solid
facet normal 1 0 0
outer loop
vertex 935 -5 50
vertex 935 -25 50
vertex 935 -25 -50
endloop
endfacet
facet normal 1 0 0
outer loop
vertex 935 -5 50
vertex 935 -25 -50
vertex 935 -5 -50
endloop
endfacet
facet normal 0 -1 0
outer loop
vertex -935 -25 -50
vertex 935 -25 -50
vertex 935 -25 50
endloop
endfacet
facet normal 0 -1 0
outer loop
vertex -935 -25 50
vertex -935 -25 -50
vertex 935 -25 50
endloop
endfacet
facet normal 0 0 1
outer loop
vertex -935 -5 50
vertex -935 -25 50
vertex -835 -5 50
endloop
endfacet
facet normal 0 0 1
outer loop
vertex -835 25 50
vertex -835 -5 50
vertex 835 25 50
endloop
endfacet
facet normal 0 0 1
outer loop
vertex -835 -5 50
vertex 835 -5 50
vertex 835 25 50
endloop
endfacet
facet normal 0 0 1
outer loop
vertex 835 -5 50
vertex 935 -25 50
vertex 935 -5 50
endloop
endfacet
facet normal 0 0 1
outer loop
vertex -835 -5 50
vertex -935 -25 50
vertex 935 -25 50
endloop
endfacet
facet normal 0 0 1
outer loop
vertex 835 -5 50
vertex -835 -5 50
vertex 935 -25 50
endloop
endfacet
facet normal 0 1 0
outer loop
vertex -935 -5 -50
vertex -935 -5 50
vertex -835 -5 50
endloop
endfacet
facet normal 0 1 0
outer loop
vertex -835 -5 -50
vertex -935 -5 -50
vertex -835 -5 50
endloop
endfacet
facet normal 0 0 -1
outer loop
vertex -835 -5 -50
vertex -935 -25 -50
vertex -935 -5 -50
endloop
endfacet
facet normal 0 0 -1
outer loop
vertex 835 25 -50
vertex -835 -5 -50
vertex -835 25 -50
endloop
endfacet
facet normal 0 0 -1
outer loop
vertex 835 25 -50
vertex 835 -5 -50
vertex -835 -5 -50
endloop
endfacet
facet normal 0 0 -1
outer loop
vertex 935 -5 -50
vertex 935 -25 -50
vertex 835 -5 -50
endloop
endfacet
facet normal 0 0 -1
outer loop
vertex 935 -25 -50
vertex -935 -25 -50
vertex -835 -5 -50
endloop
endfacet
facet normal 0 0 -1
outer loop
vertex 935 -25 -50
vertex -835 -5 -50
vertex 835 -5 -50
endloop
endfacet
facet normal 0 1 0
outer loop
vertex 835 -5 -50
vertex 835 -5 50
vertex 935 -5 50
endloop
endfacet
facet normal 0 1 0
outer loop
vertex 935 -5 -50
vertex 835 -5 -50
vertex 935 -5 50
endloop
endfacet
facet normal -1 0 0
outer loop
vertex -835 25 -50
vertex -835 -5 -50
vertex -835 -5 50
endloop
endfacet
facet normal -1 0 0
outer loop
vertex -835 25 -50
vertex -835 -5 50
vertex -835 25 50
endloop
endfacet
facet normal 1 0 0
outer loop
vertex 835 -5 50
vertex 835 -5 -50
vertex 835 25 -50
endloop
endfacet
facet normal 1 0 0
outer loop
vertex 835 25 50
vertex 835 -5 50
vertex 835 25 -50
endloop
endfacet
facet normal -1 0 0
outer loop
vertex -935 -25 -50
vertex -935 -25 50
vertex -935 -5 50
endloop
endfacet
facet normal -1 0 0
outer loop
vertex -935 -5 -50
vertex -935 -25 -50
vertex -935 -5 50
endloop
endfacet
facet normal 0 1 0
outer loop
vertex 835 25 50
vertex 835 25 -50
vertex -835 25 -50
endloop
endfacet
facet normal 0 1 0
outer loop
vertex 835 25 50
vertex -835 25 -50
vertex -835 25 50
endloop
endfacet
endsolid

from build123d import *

# Parameters (mm, degrees)
F1_W     = 50
F1_H     = 100
F2_DEPTH = 935
F3_W     = 100
F3_H     = 30
F4_DEPTH = 100.001


with BuildPart() as f2:
    # F1 (on Right) → F2 (new body, symmetric)
    with BuildSketch(Plane.YZ):
        Rectangle(F1_W, F1_H)
    extrude(amount=F2_DEPTH, both=True)

    # F3 (on face) → F4 (cut, through all)
    with BuildSketch(Plane.XY.offset(50)):
        with Locations((-885, 10)):
            Rectangle(F3_W, F3_H)
        with Locations((885, 10)):
            Rectangle(F3_W, F3_H)
    extrude(amount=-F4_DEPTH, mode=Mode.SUBTRACT)


solid = f2.part
